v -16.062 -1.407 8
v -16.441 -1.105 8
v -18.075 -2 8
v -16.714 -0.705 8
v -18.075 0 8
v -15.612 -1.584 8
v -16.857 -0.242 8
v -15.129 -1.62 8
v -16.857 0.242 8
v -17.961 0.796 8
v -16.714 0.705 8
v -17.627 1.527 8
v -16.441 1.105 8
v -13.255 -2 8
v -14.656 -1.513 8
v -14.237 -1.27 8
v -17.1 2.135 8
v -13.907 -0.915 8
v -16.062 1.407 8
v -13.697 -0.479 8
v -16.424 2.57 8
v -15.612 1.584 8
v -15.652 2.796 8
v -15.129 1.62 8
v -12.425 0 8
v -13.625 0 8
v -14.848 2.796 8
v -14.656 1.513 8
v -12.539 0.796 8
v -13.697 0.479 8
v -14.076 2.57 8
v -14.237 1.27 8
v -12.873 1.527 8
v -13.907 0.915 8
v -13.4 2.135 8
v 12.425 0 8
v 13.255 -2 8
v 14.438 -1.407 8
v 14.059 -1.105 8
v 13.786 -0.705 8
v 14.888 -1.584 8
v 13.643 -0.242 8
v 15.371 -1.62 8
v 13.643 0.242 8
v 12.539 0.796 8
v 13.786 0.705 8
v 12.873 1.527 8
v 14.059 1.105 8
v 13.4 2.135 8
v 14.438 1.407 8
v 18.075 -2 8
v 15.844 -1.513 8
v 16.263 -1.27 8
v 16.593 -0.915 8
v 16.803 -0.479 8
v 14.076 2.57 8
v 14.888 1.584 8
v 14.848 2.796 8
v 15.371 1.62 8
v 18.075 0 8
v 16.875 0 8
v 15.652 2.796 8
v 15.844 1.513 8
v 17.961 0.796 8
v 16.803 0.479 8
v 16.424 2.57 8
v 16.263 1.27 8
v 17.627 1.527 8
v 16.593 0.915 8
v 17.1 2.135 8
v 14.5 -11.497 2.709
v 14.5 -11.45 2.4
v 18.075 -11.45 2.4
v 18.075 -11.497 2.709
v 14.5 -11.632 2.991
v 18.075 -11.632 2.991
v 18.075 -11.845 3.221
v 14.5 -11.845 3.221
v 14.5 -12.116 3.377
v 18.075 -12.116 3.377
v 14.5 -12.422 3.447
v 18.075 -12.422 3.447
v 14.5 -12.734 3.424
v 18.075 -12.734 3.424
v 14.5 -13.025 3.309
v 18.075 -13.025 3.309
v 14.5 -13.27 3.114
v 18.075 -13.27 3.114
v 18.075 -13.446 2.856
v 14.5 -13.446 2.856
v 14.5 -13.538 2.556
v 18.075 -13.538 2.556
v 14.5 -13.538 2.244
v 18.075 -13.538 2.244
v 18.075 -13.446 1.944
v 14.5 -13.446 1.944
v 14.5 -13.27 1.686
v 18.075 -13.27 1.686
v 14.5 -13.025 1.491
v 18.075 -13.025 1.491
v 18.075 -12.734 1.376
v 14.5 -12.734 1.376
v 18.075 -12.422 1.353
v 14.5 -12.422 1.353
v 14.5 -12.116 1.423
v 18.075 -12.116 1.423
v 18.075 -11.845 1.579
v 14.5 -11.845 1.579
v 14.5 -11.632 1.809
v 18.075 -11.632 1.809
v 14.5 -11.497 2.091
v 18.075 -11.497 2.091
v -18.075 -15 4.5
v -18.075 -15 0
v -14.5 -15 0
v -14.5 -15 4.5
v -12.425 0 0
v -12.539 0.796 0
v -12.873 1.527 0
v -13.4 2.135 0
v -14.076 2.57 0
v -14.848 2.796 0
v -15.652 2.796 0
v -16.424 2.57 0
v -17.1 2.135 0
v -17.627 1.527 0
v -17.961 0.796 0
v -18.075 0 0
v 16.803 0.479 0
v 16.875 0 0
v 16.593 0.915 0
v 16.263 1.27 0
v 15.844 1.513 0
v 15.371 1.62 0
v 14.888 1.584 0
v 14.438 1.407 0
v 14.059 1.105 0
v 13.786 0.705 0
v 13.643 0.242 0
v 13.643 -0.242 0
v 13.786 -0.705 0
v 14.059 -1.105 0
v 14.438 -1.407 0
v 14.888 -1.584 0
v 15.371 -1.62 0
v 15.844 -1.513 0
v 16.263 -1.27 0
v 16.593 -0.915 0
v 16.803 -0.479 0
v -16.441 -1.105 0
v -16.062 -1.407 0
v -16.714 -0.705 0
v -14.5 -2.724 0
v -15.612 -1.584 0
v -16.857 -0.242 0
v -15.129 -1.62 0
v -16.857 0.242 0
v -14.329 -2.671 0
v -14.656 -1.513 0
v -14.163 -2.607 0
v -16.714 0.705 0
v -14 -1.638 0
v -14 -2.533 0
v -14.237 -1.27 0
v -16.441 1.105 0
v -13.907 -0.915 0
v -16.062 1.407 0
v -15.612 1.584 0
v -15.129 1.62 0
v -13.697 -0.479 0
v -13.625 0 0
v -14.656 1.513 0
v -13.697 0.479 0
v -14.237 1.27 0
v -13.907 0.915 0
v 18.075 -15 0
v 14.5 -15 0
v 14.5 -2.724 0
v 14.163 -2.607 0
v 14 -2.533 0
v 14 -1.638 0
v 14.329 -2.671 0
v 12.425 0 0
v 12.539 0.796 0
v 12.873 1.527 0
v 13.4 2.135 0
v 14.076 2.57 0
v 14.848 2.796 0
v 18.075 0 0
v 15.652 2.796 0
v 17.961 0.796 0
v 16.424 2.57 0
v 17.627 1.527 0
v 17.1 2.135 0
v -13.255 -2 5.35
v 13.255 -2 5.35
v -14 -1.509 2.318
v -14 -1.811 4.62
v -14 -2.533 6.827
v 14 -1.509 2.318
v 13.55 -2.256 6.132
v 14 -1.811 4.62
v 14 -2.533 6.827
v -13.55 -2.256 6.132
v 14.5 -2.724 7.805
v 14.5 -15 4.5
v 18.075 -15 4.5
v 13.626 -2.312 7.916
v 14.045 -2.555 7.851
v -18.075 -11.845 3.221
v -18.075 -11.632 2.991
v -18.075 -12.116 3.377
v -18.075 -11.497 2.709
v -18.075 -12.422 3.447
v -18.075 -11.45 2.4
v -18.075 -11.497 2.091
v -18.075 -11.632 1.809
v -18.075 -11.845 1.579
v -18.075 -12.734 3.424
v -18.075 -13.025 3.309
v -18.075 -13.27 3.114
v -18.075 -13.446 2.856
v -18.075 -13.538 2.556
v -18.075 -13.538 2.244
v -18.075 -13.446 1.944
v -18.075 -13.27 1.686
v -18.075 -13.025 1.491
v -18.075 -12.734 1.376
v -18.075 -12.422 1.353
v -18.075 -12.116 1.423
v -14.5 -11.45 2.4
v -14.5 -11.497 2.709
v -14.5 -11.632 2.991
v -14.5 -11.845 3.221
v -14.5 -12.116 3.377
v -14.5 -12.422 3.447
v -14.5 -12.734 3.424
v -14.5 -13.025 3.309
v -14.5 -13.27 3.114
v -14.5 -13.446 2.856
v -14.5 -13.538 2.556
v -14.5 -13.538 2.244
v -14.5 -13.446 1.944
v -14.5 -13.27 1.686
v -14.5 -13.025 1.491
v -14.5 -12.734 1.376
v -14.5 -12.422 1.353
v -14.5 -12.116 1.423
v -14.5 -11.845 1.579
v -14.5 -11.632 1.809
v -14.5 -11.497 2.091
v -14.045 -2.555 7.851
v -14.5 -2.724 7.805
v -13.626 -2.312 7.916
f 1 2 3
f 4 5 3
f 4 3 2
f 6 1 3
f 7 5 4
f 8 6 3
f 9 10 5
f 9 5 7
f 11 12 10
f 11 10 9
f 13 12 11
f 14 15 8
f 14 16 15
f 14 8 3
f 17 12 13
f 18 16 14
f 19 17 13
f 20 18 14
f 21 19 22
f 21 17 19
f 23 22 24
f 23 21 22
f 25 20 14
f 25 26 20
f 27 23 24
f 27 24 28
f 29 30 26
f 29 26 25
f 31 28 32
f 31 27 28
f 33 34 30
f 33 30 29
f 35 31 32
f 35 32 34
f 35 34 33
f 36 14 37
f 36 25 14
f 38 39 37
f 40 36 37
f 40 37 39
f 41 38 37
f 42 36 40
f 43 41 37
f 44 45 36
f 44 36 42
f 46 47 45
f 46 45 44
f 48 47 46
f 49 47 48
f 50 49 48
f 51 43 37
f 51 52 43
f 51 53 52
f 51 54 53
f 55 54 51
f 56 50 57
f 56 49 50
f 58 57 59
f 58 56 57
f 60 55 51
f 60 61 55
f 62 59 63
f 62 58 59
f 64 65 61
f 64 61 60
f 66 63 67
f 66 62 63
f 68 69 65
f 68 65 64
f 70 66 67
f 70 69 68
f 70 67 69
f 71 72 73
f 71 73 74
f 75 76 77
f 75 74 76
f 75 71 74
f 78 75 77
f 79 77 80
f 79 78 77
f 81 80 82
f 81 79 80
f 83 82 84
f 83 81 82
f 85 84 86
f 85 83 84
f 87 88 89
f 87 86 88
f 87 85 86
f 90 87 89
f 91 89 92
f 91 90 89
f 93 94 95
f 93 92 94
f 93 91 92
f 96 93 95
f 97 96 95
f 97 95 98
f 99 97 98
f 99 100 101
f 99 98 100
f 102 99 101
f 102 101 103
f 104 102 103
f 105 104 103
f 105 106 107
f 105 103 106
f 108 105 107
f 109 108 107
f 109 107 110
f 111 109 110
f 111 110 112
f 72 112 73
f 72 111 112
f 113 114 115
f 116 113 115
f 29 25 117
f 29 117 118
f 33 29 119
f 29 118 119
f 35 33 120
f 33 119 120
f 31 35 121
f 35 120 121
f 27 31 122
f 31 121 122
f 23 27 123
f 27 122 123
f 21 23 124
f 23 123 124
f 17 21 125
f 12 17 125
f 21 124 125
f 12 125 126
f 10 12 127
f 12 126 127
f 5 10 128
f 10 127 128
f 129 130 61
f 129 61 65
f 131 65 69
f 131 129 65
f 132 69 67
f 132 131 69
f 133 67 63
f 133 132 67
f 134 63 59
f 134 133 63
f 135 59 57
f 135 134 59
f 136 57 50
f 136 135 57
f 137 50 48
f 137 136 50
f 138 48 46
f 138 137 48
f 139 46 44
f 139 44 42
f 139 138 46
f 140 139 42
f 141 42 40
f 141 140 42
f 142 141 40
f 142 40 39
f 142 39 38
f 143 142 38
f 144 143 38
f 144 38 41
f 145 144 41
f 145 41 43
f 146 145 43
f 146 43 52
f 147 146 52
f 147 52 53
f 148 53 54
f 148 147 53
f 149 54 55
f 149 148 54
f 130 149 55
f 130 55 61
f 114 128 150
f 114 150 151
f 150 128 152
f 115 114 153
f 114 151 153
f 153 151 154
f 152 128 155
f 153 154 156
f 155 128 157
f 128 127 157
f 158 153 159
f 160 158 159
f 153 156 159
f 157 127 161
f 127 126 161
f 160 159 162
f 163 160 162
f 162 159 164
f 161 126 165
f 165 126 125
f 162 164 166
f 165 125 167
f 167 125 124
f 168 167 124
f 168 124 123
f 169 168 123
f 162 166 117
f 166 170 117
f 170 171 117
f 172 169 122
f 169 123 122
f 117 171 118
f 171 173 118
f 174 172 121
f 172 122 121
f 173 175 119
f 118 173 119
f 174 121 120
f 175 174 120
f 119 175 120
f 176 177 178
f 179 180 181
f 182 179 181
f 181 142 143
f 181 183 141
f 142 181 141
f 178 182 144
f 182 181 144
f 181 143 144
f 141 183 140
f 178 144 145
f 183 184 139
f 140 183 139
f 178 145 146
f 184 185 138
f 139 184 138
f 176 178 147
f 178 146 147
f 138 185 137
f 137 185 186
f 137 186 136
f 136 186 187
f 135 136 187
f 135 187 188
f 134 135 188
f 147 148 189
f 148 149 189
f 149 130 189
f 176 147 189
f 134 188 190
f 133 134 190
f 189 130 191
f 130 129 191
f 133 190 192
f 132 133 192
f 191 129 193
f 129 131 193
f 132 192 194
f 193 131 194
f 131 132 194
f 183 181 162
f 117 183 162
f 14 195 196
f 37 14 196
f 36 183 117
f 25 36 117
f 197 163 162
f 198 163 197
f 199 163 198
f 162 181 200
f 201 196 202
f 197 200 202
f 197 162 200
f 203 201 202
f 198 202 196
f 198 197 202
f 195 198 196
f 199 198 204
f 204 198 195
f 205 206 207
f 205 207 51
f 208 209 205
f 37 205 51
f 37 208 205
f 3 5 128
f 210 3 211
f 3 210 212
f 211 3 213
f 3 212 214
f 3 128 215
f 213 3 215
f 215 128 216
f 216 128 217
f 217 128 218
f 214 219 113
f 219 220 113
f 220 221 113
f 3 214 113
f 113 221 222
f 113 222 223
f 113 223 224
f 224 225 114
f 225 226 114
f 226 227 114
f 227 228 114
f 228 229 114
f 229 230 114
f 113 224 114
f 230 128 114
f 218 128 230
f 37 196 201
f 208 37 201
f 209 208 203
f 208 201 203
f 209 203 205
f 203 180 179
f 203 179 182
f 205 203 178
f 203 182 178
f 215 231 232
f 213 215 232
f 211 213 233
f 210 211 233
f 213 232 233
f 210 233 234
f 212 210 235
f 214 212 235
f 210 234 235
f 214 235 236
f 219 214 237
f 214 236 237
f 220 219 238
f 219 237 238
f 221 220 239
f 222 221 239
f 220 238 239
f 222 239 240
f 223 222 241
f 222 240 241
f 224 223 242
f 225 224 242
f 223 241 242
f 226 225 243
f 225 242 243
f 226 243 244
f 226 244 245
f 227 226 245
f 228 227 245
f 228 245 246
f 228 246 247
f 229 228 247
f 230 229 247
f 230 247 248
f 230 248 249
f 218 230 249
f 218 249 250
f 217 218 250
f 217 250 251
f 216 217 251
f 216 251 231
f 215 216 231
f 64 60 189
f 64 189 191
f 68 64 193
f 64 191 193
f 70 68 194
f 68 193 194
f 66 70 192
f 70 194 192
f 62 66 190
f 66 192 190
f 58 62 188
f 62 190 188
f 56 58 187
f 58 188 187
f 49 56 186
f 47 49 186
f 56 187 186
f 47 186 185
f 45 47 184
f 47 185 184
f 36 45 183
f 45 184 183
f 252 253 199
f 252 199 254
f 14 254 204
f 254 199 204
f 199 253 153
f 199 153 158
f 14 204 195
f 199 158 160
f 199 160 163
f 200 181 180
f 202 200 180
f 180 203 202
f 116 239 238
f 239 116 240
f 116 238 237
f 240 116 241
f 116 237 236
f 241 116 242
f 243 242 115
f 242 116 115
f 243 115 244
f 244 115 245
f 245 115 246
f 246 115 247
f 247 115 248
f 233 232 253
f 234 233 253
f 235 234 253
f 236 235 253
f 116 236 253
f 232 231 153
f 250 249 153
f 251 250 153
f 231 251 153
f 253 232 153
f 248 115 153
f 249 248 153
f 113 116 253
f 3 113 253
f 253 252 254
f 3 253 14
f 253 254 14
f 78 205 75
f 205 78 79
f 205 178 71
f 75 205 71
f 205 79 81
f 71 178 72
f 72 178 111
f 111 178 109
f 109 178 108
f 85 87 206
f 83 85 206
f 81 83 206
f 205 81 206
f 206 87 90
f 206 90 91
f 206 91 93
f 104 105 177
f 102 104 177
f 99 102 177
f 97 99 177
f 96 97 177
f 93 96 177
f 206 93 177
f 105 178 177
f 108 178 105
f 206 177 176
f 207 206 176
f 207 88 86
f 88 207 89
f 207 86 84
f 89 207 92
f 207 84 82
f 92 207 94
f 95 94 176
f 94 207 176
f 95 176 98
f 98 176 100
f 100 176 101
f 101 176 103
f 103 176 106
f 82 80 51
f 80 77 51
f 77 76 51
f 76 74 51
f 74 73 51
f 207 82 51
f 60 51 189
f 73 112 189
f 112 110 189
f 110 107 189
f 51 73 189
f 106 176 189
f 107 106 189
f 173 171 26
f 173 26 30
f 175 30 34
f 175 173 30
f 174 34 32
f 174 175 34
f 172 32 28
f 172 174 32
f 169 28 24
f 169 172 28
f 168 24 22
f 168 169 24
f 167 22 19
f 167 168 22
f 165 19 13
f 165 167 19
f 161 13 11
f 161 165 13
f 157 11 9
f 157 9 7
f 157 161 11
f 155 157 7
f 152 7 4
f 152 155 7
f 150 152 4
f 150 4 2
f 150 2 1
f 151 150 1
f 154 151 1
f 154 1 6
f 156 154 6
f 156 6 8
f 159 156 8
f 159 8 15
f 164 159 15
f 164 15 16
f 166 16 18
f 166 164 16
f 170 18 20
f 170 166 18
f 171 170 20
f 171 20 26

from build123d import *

# Parameters (mm, degrees)
F0_R          = 1.625
F1_DEPTH      = 8
F3_R          = 1.05
F4_DEPTH      = 18.076
F4_DEPTH_BACK = 18.076


with BuildPart() as f1:
    # F0 (on Top) → F1 (new body)
    with BuildSketch(Plane.XY):
        with BuildLine():
            Line((14.5, -15), (18.075, -15))
            Line((18.075, -15), (18.075, 0))
            ThreePointArc((18.075, 0), (16.9619981016, -2.247150974), (14.5, -2.7236235056))
            Line((14.5, -2.7236235056), (14.5, -15))
        make_face()
        with BuildLine():
            ThreePointArc((14.5, -2.7236235056), (16.9619981016, -2.247150974), (18.075, 0))
            ThreePointArc((18.075, 0), (15.25, 2.825), (12.425, 0))
            ThreePointArc((12.425, 0), (12.6406969517, -1.0826645843), (13.2548496297, -2))
            ThreePointArc((13.2548496297, -2), (13.8305386996, -2.4424894302), (14.5, -2.7236235056))
        make_face()
        with Locations((15.25, 0)):
            Circle(F0_R, mode=Mode.SUBTRACT)
        with BuildLine():
            ThreePointArc((13.2548496297, -2), (12.6406969517, -1.0826645843), (12.425, 0))
            Line((12.425, 0), (0, 0))
            Line((0, 0), (-12.425, 0))
            ThreePointArc((-12.425, 0), (-12.6406969517, -1.0826645843), (-13.2548496297, -2))
            Line((-13.2548496297, -2), (0, -2))
            Line((0, -2), (13.2548496297, -2))
        make_face()
        with BuildLine():
            ThreePointArc((-13.2548496297, -2), (-12.6406969517, -1.0826645843), (-12.425, 0))
            ThreePointArc((-12.425, 0), (-15.25, 2.825), (-18.075, 0))
            ThreePointArc((-18.075, 0), (-16.9619981016, -2.247150974), (-14.5, -2.7236235056))
            ThreePointArc((-14.5, -2.7236235056), (-13.8305386996, -2.4424894302), (-13.2548496297, -2))
        make_face()
        with Locations((-15.25, 0)):
            Circle(F0_R, mode=Mode.SUBTRACT)
        with BuildLine():
            ThreePointArc((-14.5, -2.7236235056), (-16.9619981016, -2.247150974), (-18.075, 0))
            Line((-18.075, 0), (-18.075, -15))
            Line((-18.075, -15), (-14.5, -15))
            Line((-14.5, -15), (-14.5, -2.7236235056))
        make_face()
    extrude(amount=F1_DEPTH)

    # F3 (on Right) → F4 (cut, two sides)
    with BuildSketch(Plane.YZ) as f4_sk:
        with Locations((-12.5, 2.4)):
            Circle(F3_R)
        Polygon((-15, 8), (-15, 4.5), (-2, 8), align=None)
    extrude(amount=-F4_DEPTH, mode=Mode.SUBTRACT)
    extrude(f4_sk.sketch, amount=F4_DEPTH_BACK, mode=Mode.SUBTRACT)

    # F7 (on offset) → F8 (revolve, cut)
    with BuildSketch(Plane.XY.offset(1.85)):
        Polygon((14, -1.5), (0, -1.5), (-14, -1.5), (-14, -4.7194751813), (0, -4.7194751813), (14, -4.7194751813), align=None)
    revolve(axis=Axis((3.4951923881, -14, 1.85), (1, 0, 0)), mode=Mode.SUBTRACT)


solid = f1.part
